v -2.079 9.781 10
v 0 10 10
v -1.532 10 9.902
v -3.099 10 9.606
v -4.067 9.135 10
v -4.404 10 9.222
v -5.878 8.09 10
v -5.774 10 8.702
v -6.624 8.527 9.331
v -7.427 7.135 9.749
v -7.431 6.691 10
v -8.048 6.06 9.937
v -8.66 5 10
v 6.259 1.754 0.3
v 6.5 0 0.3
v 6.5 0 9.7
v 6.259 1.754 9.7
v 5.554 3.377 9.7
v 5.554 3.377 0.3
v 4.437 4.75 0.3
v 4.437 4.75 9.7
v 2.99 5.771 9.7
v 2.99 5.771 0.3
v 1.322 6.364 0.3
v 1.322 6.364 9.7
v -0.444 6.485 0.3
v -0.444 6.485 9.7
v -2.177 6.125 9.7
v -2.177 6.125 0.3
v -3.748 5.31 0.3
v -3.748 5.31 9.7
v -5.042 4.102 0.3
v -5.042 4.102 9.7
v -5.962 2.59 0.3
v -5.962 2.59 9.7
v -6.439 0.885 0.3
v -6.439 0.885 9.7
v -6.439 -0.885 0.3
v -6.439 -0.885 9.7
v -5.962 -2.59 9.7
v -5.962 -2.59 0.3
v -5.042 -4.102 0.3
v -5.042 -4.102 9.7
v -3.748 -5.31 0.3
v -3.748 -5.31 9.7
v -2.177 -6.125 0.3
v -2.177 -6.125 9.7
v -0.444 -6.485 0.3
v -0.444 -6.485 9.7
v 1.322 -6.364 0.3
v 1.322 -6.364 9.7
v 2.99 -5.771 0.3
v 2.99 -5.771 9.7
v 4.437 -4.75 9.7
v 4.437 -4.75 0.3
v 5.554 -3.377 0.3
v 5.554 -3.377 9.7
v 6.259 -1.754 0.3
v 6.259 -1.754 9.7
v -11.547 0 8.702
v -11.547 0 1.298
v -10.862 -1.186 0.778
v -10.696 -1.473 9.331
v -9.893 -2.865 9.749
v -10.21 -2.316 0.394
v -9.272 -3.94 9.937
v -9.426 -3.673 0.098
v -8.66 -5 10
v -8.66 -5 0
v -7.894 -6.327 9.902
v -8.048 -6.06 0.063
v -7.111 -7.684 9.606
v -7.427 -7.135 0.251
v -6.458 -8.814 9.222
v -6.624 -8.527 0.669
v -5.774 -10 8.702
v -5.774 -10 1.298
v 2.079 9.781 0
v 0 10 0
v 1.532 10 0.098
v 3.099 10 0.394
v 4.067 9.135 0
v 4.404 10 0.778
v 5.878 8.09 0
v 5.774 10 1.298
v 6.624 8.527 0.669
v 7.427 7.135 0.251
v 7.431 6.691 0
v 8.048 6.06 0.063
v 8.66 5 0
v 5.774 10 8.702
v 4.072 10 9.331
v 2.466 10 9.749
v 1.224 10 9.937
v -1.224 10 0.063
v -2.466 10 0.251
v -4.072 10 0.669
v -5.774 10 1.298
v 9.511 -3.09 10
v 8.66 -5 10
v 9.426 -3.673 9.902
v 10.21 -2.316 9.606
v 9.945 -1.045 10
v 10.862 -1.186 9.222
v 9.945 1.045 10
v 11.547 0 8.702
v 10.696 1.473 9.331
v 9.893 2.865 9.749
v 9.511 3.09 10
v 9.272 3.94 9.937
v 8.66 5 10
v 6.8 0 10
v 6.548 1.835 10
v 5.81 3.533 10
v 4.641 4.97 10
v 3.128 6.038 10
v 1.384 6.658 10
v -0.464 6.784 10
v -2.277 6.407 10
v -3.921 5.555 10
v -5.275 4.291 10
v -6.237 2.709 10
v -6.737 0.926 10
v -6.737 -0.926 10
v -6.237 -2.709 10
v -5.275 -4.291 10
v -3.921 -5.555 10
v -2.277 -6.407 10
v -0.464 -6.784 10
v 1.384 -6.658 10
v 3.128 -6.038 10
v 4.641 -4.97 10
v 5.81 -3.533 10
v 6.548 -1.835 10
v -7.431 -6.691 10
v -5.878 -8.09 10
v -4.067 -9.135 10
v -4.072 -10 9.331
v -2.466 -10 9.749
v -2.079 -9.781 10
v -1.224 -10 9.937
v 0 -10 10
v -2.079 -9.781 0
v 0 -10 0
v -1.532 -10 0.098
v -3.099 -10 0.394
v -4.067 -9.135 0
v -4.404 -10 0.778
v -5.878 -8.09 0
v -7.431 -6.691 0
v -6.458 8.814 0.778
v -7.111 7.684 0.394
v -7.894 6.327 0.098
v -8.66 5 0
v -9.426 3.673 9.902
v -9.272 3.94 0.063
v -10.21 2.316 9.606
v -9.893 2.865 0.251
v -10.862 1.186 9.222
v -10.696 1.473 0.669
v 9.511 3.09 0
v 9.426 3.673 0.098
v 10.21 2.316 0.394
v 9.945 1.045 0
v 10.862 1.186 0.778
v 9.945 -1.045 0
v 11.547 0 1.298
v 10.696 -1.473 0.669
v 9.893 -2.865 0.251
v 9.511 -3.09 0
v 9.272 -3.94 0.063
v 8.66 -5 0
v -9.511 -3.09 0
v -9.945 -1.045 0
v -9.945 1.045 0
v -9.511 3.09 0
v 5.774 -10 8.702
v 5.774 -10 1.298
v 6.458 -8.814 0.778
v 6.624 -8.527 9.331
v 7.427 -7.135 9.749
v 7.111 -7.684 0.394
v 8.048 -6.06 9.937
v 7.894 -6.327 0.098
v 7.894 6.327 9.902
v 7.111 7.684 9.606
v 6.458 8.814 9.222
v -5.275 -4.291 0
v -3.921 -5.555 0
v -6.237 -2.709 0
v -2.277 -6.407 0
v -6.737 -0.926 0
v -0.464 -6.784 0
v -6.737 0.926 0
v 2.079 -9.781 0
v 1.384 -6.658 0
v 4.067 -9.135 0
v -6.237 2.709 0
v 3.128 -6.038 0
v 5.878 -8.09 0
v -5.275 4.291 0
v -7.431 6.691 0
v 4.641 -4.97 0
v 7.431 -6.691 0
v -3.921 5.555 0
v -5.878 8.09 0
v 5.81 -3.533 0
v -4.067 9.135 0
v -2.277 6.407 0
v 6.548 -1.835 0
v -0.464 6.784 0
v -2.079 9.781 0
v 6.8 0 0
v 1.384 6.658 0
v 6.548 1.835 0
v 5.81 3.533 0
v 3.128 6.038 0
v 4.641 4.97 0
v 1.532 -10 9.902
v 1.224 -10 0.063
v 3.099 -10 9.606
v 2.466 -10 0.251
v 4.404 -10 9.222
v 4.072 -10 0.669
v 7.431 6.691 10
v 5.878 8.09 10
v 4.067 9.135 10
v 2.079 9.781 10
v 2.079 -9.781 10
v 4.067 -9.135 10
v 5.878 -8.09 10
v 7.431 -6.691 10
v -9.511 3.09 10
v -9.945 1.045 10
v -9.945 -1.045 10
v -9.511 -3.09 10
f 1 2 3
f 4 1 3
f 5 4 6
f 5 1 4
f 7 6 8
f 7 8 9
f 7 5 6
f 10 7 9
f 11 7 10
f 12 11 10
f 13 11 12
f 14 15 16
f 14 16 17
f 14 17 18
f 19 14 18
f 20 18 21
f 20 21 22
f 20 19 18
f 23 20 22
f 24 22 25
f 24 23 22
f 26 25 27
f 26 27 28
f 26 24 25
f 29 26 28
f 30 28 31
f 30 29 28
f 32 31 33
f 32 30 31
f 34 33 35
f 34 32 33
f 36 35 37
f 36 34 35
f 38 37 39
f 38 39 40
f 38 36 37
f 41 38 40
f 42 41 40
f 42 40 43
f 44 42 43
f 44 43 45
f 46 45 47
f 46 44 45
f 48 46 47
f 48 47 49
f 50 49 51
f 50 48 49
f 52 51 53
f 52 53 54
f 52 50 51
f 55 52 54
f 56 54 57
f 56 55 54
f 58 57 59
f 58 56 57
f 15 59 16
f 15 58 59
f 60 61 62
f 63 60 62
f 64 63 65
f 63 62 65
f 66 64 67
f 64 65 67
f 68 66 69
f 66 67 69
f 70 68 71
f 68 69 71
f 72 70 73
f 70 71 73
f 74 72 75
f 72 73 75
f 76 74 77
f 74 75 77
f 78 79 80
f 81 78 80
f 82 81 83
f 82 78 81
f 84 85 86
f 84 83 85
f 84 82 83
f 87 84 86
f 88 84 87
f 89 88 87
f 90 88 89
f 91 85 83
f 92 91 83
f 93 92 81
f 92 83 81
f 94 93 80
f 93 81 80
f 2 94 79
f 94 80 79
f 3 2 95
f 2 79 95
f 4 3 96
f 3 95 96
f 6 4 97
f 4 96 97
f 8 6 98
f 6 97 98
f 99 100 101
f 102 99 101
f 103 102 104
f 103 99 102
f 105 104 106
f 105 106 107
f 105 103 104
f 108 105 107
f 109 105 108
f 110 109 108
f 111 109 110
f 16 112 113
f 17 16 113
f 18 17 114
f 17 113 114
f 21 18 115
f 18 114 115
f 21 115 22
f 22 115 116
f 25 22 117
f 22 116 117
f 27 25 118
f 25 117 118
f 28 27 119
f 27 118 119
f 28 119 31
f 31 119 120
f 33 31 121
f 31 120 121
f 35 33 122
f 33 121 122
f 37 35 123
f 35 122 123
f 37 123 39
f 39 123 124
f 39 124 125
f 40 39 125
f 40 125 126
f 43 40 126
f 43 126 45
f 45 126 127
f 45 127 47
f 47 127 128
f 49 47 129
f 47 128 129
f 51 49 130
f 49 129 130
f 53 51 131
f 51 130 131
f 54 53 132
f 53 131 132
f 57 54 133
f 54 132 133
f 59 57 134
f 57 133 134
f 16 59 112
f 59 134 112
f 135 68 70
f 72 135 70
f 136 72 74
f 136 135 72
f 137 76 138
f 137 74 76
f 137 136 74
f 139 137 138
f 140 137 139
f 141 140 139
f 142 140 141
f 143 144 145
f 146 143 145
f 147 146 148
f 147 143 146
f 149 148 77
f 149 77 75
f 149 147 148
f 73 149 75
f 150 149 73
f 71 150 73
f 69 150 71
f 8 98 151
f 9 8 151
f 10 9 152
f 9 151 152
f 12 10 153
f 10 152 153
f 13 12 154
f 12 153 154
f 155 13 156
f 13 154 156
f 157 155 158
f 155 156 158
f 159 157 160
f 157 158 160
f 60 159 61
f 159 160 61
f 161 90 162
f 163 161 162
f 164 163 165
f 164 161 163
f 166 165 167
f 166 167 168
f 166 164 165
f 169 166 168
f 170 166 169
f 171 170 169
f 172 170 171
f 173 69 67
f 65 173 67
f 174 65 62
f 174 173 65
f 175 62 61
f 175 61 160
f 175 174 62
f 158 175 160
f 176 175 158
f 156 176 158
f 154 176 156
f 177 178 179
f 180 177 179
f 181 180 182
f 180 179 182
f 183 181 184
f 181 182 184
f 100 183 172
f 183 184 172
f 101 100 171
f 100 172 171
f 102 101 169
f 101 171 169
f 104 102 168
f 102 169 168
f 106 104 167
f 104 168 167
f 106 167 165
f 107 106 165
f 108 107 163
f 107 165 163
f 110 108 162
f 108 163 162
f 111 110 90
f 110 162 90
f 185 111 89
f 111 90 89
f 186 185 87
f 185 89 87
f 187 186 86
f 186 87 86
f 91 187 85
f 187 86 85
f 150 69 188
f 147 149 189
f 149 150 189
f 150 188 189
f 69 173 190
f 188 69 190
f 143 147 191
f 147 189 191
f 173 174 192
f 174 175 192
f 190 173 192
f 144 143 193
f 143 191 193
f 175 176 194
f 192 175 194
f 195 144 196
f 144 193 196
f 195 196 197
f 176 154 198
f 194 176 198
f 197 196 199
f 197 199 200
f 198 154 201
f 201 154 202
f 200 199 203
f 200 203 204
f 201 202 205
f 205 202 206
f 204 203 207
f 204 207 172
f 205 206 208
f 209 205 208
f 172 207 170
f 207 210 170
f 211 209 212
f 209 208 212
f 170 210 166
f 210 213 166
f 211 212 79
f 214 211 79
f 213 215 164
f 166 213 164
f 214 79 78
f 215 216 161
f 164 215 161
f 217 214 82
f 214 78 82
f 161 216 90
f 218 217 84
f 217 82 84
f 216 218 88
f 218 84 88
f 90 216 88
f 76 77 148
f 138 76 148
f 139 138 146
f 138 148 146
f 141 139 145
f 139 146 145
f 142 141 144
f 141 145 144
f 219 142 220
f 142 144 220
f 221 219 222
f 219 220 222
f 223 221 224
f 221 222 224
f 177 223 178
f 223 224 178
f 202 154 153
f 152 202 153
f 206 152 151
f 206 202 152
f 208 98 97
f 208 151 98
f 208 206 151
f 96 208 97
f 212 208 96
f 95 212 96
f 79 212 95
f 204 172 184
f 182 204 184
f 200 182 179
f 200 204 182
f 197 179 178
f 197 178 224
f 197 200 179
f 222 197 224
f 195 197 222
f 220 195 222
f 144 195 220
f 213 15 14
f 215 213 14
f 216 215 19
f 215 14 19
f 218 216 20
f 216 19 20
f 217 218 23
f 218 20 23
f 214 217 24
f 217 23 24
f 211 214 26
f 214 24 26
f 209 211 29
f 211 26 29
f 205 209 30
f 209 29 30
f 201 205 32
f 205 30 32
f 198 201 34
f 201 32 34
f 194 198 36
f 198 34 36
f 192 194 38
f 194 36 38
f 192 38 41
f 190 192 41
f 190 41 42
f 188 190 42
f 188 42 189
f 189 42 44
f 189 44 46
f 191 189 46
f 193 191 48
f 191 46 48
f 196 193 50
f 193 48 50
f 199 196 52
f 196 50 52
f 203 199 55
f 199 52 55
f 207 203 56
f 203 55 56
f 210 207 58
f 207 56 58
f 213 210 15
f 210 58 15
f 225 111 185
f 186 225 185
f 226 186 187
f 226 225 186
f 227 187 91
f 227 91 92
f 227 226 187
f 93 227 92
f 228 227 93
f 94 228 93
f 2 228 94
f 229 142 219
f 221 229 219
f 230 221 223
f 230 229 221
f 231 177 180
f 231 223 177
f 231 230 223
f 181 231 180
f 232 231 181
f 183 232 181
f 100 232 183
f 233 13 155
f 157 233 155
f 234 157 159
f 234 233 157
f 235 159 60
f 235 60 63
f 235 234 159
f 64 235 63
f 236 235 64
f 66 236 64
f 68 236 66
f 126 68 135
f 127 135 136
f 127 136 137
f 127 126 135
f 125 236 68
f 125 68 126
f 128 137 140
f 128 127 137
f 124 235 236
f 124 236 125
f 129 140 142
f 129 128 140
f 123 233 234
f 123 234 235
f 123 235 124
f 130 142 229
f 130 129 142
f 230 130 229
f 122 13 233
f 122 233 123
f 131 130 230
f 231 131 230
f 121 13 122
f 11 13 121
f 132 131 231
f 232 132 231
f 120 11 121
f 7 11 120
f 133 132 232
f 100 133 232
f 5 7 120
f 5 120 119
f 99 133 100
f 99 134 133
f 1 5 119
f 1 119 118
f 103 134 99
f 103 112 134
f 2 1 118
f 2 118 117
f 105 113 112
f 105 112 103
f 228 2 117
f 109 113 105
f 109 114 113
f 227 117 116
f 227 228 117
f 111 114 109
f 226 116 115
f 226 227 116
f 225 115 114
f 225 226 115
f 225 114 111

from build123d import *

# Parameters (mm, degrees)
SKETCH1_R               = 6.5
BOSS_EXTRUDE1_DEPTH     = 10
SKETCH2_OUTSIDE_W       = 38.674
SKETCH2_OUTSIDE_H       = 35.58
SKETCH2_OUTSIDE_R       = 10
CUT_EXTRUDE1_DEPTH      = 3
CUT_EXTRUDE1_DRAFT      = -50
MIRROR1_COPY_1_SKETCH_W = 38.674
MIRROR1_COPY_1_SKETCH_H = 35.58
MIRROR1_COPY_1_SKETCH_R = 10
MIRROR1_COPY_1_DEPTH    = 3
MIRROR1_COPY_1_DRAFT    = -50
CHAMFER1_SIZE           = 0.3


with BuildPart() as part:
    # Sketch1 → Boss-Extrude1 (new body)
    with BuildSketch(Plane.XY):
        Polygon((-11.547005384, 0), (-5.773502692, -10), (5.773502692, -10), (11.547005384, 0), (5.773502692, 10), (-5.773502692, 10), align=None)
        Circle(SKETCH1_R, mode=Mode.SUBTRACT)
    extrude(amount=BOSS_EXTRUDE1_DEPTH)


with BuildPart() as cut_extrude1_tool:
    # Sketch2 outside → Cut-Extrude1 (with draft: the straight prism first)
    with BuildSketch(Plane.XY.offset(10)):
        Rectangle(SKETCH2_OUTSIDE_W, SKETCH2_OUTSIDE_H)
        Circle(SKETCH2_OUTSIDE_R, mode=Mode.SUBTRACT)
    extrude(amount=-CUT_EXTRUDE1_DEPTH)
    # Cut-Extrude1: the draft: its side faces are tilted about the plane it starts from
    cut_extrude1_sides = [cut_extrude1_tool.faces().sort_by_distance(p)[0] for p in [
        (0, -17.79, 8.5),
        (19.337, 0, 8.5),
        (0, 17.79, 8.5),
        (-19.337, 0, 8.5),
        (-10, 0, 8.5),
    ]]
    draft(cut_extrude1_sides, Plane.XY.offset(10), CUT_EXTRUDE1_DRAFT)


with BuildPart() as part_1:
    add(part.part)

    # Cut-Extrude1: cut by cut_extrude1_tool
    add(cut_extrude1_tool.part, mode=Mode.SUBTRACT)


with BuildPart() as mirror1_copy_1_tool:
    # Mirror1 copy 1 sketch → Mirror1 copy 1 (with draft: the straight prism first)
    with BuildSketch(Plane(origin=(0, 0, 0), x_dir=(1, 0, 0), z_dir=(0, 0, -1))):
        Rectangle(MIRROR1_COPY_1_SKETCH_W, MIRROR1_COPY_1_SKETCH_H)
        Circle(MIRROR1_COPY_1_SKETCH_R, mode=Mode.SUBTRACT)
    extrude(amount=-MIRROR1_COPY_1_DEPTH)
    # Mirror1 copy 1: the draft: its side faces are tilted about the plane it starts from
    mirror1_copy_1_sides = [mirror1_copy_1_tool.faces().sort_by_distance(p)[0] for p in [
        (0, -17.79, 1.5),
        (19.337, 0, 1.5),
        (0, 17.79, 1.5),
        (-19.337, 0, 1.5),
        (-10, 0, 1.5),
    ]]
    draft(mirror1_copy_1_sides, Plane(origin=(0, 0, 0), x_dir=(1, 0, 0), z_dir=(0, 0, -1)), MIRROR1_COPY_1_DRAFT)


with BuildPart() as part_2:
    add(part_1.part)

    # Mirror1 copy 1: cut by mirror1_copy_1_tool
    add(mirror1_copy_1_tool.part, mode=Mode.SUBTRACT)

    # Chamfer1
    chamfer1_edges = [part_2.edges().sort_by_distance(p)[0] for p in [
        (-6.5, 0, 0),
        (-6.5, 0, 10),
    ]]
    chamfer(chamfer1_edges, length=CHAMFER1_SIZE)


solid = part_2.part
